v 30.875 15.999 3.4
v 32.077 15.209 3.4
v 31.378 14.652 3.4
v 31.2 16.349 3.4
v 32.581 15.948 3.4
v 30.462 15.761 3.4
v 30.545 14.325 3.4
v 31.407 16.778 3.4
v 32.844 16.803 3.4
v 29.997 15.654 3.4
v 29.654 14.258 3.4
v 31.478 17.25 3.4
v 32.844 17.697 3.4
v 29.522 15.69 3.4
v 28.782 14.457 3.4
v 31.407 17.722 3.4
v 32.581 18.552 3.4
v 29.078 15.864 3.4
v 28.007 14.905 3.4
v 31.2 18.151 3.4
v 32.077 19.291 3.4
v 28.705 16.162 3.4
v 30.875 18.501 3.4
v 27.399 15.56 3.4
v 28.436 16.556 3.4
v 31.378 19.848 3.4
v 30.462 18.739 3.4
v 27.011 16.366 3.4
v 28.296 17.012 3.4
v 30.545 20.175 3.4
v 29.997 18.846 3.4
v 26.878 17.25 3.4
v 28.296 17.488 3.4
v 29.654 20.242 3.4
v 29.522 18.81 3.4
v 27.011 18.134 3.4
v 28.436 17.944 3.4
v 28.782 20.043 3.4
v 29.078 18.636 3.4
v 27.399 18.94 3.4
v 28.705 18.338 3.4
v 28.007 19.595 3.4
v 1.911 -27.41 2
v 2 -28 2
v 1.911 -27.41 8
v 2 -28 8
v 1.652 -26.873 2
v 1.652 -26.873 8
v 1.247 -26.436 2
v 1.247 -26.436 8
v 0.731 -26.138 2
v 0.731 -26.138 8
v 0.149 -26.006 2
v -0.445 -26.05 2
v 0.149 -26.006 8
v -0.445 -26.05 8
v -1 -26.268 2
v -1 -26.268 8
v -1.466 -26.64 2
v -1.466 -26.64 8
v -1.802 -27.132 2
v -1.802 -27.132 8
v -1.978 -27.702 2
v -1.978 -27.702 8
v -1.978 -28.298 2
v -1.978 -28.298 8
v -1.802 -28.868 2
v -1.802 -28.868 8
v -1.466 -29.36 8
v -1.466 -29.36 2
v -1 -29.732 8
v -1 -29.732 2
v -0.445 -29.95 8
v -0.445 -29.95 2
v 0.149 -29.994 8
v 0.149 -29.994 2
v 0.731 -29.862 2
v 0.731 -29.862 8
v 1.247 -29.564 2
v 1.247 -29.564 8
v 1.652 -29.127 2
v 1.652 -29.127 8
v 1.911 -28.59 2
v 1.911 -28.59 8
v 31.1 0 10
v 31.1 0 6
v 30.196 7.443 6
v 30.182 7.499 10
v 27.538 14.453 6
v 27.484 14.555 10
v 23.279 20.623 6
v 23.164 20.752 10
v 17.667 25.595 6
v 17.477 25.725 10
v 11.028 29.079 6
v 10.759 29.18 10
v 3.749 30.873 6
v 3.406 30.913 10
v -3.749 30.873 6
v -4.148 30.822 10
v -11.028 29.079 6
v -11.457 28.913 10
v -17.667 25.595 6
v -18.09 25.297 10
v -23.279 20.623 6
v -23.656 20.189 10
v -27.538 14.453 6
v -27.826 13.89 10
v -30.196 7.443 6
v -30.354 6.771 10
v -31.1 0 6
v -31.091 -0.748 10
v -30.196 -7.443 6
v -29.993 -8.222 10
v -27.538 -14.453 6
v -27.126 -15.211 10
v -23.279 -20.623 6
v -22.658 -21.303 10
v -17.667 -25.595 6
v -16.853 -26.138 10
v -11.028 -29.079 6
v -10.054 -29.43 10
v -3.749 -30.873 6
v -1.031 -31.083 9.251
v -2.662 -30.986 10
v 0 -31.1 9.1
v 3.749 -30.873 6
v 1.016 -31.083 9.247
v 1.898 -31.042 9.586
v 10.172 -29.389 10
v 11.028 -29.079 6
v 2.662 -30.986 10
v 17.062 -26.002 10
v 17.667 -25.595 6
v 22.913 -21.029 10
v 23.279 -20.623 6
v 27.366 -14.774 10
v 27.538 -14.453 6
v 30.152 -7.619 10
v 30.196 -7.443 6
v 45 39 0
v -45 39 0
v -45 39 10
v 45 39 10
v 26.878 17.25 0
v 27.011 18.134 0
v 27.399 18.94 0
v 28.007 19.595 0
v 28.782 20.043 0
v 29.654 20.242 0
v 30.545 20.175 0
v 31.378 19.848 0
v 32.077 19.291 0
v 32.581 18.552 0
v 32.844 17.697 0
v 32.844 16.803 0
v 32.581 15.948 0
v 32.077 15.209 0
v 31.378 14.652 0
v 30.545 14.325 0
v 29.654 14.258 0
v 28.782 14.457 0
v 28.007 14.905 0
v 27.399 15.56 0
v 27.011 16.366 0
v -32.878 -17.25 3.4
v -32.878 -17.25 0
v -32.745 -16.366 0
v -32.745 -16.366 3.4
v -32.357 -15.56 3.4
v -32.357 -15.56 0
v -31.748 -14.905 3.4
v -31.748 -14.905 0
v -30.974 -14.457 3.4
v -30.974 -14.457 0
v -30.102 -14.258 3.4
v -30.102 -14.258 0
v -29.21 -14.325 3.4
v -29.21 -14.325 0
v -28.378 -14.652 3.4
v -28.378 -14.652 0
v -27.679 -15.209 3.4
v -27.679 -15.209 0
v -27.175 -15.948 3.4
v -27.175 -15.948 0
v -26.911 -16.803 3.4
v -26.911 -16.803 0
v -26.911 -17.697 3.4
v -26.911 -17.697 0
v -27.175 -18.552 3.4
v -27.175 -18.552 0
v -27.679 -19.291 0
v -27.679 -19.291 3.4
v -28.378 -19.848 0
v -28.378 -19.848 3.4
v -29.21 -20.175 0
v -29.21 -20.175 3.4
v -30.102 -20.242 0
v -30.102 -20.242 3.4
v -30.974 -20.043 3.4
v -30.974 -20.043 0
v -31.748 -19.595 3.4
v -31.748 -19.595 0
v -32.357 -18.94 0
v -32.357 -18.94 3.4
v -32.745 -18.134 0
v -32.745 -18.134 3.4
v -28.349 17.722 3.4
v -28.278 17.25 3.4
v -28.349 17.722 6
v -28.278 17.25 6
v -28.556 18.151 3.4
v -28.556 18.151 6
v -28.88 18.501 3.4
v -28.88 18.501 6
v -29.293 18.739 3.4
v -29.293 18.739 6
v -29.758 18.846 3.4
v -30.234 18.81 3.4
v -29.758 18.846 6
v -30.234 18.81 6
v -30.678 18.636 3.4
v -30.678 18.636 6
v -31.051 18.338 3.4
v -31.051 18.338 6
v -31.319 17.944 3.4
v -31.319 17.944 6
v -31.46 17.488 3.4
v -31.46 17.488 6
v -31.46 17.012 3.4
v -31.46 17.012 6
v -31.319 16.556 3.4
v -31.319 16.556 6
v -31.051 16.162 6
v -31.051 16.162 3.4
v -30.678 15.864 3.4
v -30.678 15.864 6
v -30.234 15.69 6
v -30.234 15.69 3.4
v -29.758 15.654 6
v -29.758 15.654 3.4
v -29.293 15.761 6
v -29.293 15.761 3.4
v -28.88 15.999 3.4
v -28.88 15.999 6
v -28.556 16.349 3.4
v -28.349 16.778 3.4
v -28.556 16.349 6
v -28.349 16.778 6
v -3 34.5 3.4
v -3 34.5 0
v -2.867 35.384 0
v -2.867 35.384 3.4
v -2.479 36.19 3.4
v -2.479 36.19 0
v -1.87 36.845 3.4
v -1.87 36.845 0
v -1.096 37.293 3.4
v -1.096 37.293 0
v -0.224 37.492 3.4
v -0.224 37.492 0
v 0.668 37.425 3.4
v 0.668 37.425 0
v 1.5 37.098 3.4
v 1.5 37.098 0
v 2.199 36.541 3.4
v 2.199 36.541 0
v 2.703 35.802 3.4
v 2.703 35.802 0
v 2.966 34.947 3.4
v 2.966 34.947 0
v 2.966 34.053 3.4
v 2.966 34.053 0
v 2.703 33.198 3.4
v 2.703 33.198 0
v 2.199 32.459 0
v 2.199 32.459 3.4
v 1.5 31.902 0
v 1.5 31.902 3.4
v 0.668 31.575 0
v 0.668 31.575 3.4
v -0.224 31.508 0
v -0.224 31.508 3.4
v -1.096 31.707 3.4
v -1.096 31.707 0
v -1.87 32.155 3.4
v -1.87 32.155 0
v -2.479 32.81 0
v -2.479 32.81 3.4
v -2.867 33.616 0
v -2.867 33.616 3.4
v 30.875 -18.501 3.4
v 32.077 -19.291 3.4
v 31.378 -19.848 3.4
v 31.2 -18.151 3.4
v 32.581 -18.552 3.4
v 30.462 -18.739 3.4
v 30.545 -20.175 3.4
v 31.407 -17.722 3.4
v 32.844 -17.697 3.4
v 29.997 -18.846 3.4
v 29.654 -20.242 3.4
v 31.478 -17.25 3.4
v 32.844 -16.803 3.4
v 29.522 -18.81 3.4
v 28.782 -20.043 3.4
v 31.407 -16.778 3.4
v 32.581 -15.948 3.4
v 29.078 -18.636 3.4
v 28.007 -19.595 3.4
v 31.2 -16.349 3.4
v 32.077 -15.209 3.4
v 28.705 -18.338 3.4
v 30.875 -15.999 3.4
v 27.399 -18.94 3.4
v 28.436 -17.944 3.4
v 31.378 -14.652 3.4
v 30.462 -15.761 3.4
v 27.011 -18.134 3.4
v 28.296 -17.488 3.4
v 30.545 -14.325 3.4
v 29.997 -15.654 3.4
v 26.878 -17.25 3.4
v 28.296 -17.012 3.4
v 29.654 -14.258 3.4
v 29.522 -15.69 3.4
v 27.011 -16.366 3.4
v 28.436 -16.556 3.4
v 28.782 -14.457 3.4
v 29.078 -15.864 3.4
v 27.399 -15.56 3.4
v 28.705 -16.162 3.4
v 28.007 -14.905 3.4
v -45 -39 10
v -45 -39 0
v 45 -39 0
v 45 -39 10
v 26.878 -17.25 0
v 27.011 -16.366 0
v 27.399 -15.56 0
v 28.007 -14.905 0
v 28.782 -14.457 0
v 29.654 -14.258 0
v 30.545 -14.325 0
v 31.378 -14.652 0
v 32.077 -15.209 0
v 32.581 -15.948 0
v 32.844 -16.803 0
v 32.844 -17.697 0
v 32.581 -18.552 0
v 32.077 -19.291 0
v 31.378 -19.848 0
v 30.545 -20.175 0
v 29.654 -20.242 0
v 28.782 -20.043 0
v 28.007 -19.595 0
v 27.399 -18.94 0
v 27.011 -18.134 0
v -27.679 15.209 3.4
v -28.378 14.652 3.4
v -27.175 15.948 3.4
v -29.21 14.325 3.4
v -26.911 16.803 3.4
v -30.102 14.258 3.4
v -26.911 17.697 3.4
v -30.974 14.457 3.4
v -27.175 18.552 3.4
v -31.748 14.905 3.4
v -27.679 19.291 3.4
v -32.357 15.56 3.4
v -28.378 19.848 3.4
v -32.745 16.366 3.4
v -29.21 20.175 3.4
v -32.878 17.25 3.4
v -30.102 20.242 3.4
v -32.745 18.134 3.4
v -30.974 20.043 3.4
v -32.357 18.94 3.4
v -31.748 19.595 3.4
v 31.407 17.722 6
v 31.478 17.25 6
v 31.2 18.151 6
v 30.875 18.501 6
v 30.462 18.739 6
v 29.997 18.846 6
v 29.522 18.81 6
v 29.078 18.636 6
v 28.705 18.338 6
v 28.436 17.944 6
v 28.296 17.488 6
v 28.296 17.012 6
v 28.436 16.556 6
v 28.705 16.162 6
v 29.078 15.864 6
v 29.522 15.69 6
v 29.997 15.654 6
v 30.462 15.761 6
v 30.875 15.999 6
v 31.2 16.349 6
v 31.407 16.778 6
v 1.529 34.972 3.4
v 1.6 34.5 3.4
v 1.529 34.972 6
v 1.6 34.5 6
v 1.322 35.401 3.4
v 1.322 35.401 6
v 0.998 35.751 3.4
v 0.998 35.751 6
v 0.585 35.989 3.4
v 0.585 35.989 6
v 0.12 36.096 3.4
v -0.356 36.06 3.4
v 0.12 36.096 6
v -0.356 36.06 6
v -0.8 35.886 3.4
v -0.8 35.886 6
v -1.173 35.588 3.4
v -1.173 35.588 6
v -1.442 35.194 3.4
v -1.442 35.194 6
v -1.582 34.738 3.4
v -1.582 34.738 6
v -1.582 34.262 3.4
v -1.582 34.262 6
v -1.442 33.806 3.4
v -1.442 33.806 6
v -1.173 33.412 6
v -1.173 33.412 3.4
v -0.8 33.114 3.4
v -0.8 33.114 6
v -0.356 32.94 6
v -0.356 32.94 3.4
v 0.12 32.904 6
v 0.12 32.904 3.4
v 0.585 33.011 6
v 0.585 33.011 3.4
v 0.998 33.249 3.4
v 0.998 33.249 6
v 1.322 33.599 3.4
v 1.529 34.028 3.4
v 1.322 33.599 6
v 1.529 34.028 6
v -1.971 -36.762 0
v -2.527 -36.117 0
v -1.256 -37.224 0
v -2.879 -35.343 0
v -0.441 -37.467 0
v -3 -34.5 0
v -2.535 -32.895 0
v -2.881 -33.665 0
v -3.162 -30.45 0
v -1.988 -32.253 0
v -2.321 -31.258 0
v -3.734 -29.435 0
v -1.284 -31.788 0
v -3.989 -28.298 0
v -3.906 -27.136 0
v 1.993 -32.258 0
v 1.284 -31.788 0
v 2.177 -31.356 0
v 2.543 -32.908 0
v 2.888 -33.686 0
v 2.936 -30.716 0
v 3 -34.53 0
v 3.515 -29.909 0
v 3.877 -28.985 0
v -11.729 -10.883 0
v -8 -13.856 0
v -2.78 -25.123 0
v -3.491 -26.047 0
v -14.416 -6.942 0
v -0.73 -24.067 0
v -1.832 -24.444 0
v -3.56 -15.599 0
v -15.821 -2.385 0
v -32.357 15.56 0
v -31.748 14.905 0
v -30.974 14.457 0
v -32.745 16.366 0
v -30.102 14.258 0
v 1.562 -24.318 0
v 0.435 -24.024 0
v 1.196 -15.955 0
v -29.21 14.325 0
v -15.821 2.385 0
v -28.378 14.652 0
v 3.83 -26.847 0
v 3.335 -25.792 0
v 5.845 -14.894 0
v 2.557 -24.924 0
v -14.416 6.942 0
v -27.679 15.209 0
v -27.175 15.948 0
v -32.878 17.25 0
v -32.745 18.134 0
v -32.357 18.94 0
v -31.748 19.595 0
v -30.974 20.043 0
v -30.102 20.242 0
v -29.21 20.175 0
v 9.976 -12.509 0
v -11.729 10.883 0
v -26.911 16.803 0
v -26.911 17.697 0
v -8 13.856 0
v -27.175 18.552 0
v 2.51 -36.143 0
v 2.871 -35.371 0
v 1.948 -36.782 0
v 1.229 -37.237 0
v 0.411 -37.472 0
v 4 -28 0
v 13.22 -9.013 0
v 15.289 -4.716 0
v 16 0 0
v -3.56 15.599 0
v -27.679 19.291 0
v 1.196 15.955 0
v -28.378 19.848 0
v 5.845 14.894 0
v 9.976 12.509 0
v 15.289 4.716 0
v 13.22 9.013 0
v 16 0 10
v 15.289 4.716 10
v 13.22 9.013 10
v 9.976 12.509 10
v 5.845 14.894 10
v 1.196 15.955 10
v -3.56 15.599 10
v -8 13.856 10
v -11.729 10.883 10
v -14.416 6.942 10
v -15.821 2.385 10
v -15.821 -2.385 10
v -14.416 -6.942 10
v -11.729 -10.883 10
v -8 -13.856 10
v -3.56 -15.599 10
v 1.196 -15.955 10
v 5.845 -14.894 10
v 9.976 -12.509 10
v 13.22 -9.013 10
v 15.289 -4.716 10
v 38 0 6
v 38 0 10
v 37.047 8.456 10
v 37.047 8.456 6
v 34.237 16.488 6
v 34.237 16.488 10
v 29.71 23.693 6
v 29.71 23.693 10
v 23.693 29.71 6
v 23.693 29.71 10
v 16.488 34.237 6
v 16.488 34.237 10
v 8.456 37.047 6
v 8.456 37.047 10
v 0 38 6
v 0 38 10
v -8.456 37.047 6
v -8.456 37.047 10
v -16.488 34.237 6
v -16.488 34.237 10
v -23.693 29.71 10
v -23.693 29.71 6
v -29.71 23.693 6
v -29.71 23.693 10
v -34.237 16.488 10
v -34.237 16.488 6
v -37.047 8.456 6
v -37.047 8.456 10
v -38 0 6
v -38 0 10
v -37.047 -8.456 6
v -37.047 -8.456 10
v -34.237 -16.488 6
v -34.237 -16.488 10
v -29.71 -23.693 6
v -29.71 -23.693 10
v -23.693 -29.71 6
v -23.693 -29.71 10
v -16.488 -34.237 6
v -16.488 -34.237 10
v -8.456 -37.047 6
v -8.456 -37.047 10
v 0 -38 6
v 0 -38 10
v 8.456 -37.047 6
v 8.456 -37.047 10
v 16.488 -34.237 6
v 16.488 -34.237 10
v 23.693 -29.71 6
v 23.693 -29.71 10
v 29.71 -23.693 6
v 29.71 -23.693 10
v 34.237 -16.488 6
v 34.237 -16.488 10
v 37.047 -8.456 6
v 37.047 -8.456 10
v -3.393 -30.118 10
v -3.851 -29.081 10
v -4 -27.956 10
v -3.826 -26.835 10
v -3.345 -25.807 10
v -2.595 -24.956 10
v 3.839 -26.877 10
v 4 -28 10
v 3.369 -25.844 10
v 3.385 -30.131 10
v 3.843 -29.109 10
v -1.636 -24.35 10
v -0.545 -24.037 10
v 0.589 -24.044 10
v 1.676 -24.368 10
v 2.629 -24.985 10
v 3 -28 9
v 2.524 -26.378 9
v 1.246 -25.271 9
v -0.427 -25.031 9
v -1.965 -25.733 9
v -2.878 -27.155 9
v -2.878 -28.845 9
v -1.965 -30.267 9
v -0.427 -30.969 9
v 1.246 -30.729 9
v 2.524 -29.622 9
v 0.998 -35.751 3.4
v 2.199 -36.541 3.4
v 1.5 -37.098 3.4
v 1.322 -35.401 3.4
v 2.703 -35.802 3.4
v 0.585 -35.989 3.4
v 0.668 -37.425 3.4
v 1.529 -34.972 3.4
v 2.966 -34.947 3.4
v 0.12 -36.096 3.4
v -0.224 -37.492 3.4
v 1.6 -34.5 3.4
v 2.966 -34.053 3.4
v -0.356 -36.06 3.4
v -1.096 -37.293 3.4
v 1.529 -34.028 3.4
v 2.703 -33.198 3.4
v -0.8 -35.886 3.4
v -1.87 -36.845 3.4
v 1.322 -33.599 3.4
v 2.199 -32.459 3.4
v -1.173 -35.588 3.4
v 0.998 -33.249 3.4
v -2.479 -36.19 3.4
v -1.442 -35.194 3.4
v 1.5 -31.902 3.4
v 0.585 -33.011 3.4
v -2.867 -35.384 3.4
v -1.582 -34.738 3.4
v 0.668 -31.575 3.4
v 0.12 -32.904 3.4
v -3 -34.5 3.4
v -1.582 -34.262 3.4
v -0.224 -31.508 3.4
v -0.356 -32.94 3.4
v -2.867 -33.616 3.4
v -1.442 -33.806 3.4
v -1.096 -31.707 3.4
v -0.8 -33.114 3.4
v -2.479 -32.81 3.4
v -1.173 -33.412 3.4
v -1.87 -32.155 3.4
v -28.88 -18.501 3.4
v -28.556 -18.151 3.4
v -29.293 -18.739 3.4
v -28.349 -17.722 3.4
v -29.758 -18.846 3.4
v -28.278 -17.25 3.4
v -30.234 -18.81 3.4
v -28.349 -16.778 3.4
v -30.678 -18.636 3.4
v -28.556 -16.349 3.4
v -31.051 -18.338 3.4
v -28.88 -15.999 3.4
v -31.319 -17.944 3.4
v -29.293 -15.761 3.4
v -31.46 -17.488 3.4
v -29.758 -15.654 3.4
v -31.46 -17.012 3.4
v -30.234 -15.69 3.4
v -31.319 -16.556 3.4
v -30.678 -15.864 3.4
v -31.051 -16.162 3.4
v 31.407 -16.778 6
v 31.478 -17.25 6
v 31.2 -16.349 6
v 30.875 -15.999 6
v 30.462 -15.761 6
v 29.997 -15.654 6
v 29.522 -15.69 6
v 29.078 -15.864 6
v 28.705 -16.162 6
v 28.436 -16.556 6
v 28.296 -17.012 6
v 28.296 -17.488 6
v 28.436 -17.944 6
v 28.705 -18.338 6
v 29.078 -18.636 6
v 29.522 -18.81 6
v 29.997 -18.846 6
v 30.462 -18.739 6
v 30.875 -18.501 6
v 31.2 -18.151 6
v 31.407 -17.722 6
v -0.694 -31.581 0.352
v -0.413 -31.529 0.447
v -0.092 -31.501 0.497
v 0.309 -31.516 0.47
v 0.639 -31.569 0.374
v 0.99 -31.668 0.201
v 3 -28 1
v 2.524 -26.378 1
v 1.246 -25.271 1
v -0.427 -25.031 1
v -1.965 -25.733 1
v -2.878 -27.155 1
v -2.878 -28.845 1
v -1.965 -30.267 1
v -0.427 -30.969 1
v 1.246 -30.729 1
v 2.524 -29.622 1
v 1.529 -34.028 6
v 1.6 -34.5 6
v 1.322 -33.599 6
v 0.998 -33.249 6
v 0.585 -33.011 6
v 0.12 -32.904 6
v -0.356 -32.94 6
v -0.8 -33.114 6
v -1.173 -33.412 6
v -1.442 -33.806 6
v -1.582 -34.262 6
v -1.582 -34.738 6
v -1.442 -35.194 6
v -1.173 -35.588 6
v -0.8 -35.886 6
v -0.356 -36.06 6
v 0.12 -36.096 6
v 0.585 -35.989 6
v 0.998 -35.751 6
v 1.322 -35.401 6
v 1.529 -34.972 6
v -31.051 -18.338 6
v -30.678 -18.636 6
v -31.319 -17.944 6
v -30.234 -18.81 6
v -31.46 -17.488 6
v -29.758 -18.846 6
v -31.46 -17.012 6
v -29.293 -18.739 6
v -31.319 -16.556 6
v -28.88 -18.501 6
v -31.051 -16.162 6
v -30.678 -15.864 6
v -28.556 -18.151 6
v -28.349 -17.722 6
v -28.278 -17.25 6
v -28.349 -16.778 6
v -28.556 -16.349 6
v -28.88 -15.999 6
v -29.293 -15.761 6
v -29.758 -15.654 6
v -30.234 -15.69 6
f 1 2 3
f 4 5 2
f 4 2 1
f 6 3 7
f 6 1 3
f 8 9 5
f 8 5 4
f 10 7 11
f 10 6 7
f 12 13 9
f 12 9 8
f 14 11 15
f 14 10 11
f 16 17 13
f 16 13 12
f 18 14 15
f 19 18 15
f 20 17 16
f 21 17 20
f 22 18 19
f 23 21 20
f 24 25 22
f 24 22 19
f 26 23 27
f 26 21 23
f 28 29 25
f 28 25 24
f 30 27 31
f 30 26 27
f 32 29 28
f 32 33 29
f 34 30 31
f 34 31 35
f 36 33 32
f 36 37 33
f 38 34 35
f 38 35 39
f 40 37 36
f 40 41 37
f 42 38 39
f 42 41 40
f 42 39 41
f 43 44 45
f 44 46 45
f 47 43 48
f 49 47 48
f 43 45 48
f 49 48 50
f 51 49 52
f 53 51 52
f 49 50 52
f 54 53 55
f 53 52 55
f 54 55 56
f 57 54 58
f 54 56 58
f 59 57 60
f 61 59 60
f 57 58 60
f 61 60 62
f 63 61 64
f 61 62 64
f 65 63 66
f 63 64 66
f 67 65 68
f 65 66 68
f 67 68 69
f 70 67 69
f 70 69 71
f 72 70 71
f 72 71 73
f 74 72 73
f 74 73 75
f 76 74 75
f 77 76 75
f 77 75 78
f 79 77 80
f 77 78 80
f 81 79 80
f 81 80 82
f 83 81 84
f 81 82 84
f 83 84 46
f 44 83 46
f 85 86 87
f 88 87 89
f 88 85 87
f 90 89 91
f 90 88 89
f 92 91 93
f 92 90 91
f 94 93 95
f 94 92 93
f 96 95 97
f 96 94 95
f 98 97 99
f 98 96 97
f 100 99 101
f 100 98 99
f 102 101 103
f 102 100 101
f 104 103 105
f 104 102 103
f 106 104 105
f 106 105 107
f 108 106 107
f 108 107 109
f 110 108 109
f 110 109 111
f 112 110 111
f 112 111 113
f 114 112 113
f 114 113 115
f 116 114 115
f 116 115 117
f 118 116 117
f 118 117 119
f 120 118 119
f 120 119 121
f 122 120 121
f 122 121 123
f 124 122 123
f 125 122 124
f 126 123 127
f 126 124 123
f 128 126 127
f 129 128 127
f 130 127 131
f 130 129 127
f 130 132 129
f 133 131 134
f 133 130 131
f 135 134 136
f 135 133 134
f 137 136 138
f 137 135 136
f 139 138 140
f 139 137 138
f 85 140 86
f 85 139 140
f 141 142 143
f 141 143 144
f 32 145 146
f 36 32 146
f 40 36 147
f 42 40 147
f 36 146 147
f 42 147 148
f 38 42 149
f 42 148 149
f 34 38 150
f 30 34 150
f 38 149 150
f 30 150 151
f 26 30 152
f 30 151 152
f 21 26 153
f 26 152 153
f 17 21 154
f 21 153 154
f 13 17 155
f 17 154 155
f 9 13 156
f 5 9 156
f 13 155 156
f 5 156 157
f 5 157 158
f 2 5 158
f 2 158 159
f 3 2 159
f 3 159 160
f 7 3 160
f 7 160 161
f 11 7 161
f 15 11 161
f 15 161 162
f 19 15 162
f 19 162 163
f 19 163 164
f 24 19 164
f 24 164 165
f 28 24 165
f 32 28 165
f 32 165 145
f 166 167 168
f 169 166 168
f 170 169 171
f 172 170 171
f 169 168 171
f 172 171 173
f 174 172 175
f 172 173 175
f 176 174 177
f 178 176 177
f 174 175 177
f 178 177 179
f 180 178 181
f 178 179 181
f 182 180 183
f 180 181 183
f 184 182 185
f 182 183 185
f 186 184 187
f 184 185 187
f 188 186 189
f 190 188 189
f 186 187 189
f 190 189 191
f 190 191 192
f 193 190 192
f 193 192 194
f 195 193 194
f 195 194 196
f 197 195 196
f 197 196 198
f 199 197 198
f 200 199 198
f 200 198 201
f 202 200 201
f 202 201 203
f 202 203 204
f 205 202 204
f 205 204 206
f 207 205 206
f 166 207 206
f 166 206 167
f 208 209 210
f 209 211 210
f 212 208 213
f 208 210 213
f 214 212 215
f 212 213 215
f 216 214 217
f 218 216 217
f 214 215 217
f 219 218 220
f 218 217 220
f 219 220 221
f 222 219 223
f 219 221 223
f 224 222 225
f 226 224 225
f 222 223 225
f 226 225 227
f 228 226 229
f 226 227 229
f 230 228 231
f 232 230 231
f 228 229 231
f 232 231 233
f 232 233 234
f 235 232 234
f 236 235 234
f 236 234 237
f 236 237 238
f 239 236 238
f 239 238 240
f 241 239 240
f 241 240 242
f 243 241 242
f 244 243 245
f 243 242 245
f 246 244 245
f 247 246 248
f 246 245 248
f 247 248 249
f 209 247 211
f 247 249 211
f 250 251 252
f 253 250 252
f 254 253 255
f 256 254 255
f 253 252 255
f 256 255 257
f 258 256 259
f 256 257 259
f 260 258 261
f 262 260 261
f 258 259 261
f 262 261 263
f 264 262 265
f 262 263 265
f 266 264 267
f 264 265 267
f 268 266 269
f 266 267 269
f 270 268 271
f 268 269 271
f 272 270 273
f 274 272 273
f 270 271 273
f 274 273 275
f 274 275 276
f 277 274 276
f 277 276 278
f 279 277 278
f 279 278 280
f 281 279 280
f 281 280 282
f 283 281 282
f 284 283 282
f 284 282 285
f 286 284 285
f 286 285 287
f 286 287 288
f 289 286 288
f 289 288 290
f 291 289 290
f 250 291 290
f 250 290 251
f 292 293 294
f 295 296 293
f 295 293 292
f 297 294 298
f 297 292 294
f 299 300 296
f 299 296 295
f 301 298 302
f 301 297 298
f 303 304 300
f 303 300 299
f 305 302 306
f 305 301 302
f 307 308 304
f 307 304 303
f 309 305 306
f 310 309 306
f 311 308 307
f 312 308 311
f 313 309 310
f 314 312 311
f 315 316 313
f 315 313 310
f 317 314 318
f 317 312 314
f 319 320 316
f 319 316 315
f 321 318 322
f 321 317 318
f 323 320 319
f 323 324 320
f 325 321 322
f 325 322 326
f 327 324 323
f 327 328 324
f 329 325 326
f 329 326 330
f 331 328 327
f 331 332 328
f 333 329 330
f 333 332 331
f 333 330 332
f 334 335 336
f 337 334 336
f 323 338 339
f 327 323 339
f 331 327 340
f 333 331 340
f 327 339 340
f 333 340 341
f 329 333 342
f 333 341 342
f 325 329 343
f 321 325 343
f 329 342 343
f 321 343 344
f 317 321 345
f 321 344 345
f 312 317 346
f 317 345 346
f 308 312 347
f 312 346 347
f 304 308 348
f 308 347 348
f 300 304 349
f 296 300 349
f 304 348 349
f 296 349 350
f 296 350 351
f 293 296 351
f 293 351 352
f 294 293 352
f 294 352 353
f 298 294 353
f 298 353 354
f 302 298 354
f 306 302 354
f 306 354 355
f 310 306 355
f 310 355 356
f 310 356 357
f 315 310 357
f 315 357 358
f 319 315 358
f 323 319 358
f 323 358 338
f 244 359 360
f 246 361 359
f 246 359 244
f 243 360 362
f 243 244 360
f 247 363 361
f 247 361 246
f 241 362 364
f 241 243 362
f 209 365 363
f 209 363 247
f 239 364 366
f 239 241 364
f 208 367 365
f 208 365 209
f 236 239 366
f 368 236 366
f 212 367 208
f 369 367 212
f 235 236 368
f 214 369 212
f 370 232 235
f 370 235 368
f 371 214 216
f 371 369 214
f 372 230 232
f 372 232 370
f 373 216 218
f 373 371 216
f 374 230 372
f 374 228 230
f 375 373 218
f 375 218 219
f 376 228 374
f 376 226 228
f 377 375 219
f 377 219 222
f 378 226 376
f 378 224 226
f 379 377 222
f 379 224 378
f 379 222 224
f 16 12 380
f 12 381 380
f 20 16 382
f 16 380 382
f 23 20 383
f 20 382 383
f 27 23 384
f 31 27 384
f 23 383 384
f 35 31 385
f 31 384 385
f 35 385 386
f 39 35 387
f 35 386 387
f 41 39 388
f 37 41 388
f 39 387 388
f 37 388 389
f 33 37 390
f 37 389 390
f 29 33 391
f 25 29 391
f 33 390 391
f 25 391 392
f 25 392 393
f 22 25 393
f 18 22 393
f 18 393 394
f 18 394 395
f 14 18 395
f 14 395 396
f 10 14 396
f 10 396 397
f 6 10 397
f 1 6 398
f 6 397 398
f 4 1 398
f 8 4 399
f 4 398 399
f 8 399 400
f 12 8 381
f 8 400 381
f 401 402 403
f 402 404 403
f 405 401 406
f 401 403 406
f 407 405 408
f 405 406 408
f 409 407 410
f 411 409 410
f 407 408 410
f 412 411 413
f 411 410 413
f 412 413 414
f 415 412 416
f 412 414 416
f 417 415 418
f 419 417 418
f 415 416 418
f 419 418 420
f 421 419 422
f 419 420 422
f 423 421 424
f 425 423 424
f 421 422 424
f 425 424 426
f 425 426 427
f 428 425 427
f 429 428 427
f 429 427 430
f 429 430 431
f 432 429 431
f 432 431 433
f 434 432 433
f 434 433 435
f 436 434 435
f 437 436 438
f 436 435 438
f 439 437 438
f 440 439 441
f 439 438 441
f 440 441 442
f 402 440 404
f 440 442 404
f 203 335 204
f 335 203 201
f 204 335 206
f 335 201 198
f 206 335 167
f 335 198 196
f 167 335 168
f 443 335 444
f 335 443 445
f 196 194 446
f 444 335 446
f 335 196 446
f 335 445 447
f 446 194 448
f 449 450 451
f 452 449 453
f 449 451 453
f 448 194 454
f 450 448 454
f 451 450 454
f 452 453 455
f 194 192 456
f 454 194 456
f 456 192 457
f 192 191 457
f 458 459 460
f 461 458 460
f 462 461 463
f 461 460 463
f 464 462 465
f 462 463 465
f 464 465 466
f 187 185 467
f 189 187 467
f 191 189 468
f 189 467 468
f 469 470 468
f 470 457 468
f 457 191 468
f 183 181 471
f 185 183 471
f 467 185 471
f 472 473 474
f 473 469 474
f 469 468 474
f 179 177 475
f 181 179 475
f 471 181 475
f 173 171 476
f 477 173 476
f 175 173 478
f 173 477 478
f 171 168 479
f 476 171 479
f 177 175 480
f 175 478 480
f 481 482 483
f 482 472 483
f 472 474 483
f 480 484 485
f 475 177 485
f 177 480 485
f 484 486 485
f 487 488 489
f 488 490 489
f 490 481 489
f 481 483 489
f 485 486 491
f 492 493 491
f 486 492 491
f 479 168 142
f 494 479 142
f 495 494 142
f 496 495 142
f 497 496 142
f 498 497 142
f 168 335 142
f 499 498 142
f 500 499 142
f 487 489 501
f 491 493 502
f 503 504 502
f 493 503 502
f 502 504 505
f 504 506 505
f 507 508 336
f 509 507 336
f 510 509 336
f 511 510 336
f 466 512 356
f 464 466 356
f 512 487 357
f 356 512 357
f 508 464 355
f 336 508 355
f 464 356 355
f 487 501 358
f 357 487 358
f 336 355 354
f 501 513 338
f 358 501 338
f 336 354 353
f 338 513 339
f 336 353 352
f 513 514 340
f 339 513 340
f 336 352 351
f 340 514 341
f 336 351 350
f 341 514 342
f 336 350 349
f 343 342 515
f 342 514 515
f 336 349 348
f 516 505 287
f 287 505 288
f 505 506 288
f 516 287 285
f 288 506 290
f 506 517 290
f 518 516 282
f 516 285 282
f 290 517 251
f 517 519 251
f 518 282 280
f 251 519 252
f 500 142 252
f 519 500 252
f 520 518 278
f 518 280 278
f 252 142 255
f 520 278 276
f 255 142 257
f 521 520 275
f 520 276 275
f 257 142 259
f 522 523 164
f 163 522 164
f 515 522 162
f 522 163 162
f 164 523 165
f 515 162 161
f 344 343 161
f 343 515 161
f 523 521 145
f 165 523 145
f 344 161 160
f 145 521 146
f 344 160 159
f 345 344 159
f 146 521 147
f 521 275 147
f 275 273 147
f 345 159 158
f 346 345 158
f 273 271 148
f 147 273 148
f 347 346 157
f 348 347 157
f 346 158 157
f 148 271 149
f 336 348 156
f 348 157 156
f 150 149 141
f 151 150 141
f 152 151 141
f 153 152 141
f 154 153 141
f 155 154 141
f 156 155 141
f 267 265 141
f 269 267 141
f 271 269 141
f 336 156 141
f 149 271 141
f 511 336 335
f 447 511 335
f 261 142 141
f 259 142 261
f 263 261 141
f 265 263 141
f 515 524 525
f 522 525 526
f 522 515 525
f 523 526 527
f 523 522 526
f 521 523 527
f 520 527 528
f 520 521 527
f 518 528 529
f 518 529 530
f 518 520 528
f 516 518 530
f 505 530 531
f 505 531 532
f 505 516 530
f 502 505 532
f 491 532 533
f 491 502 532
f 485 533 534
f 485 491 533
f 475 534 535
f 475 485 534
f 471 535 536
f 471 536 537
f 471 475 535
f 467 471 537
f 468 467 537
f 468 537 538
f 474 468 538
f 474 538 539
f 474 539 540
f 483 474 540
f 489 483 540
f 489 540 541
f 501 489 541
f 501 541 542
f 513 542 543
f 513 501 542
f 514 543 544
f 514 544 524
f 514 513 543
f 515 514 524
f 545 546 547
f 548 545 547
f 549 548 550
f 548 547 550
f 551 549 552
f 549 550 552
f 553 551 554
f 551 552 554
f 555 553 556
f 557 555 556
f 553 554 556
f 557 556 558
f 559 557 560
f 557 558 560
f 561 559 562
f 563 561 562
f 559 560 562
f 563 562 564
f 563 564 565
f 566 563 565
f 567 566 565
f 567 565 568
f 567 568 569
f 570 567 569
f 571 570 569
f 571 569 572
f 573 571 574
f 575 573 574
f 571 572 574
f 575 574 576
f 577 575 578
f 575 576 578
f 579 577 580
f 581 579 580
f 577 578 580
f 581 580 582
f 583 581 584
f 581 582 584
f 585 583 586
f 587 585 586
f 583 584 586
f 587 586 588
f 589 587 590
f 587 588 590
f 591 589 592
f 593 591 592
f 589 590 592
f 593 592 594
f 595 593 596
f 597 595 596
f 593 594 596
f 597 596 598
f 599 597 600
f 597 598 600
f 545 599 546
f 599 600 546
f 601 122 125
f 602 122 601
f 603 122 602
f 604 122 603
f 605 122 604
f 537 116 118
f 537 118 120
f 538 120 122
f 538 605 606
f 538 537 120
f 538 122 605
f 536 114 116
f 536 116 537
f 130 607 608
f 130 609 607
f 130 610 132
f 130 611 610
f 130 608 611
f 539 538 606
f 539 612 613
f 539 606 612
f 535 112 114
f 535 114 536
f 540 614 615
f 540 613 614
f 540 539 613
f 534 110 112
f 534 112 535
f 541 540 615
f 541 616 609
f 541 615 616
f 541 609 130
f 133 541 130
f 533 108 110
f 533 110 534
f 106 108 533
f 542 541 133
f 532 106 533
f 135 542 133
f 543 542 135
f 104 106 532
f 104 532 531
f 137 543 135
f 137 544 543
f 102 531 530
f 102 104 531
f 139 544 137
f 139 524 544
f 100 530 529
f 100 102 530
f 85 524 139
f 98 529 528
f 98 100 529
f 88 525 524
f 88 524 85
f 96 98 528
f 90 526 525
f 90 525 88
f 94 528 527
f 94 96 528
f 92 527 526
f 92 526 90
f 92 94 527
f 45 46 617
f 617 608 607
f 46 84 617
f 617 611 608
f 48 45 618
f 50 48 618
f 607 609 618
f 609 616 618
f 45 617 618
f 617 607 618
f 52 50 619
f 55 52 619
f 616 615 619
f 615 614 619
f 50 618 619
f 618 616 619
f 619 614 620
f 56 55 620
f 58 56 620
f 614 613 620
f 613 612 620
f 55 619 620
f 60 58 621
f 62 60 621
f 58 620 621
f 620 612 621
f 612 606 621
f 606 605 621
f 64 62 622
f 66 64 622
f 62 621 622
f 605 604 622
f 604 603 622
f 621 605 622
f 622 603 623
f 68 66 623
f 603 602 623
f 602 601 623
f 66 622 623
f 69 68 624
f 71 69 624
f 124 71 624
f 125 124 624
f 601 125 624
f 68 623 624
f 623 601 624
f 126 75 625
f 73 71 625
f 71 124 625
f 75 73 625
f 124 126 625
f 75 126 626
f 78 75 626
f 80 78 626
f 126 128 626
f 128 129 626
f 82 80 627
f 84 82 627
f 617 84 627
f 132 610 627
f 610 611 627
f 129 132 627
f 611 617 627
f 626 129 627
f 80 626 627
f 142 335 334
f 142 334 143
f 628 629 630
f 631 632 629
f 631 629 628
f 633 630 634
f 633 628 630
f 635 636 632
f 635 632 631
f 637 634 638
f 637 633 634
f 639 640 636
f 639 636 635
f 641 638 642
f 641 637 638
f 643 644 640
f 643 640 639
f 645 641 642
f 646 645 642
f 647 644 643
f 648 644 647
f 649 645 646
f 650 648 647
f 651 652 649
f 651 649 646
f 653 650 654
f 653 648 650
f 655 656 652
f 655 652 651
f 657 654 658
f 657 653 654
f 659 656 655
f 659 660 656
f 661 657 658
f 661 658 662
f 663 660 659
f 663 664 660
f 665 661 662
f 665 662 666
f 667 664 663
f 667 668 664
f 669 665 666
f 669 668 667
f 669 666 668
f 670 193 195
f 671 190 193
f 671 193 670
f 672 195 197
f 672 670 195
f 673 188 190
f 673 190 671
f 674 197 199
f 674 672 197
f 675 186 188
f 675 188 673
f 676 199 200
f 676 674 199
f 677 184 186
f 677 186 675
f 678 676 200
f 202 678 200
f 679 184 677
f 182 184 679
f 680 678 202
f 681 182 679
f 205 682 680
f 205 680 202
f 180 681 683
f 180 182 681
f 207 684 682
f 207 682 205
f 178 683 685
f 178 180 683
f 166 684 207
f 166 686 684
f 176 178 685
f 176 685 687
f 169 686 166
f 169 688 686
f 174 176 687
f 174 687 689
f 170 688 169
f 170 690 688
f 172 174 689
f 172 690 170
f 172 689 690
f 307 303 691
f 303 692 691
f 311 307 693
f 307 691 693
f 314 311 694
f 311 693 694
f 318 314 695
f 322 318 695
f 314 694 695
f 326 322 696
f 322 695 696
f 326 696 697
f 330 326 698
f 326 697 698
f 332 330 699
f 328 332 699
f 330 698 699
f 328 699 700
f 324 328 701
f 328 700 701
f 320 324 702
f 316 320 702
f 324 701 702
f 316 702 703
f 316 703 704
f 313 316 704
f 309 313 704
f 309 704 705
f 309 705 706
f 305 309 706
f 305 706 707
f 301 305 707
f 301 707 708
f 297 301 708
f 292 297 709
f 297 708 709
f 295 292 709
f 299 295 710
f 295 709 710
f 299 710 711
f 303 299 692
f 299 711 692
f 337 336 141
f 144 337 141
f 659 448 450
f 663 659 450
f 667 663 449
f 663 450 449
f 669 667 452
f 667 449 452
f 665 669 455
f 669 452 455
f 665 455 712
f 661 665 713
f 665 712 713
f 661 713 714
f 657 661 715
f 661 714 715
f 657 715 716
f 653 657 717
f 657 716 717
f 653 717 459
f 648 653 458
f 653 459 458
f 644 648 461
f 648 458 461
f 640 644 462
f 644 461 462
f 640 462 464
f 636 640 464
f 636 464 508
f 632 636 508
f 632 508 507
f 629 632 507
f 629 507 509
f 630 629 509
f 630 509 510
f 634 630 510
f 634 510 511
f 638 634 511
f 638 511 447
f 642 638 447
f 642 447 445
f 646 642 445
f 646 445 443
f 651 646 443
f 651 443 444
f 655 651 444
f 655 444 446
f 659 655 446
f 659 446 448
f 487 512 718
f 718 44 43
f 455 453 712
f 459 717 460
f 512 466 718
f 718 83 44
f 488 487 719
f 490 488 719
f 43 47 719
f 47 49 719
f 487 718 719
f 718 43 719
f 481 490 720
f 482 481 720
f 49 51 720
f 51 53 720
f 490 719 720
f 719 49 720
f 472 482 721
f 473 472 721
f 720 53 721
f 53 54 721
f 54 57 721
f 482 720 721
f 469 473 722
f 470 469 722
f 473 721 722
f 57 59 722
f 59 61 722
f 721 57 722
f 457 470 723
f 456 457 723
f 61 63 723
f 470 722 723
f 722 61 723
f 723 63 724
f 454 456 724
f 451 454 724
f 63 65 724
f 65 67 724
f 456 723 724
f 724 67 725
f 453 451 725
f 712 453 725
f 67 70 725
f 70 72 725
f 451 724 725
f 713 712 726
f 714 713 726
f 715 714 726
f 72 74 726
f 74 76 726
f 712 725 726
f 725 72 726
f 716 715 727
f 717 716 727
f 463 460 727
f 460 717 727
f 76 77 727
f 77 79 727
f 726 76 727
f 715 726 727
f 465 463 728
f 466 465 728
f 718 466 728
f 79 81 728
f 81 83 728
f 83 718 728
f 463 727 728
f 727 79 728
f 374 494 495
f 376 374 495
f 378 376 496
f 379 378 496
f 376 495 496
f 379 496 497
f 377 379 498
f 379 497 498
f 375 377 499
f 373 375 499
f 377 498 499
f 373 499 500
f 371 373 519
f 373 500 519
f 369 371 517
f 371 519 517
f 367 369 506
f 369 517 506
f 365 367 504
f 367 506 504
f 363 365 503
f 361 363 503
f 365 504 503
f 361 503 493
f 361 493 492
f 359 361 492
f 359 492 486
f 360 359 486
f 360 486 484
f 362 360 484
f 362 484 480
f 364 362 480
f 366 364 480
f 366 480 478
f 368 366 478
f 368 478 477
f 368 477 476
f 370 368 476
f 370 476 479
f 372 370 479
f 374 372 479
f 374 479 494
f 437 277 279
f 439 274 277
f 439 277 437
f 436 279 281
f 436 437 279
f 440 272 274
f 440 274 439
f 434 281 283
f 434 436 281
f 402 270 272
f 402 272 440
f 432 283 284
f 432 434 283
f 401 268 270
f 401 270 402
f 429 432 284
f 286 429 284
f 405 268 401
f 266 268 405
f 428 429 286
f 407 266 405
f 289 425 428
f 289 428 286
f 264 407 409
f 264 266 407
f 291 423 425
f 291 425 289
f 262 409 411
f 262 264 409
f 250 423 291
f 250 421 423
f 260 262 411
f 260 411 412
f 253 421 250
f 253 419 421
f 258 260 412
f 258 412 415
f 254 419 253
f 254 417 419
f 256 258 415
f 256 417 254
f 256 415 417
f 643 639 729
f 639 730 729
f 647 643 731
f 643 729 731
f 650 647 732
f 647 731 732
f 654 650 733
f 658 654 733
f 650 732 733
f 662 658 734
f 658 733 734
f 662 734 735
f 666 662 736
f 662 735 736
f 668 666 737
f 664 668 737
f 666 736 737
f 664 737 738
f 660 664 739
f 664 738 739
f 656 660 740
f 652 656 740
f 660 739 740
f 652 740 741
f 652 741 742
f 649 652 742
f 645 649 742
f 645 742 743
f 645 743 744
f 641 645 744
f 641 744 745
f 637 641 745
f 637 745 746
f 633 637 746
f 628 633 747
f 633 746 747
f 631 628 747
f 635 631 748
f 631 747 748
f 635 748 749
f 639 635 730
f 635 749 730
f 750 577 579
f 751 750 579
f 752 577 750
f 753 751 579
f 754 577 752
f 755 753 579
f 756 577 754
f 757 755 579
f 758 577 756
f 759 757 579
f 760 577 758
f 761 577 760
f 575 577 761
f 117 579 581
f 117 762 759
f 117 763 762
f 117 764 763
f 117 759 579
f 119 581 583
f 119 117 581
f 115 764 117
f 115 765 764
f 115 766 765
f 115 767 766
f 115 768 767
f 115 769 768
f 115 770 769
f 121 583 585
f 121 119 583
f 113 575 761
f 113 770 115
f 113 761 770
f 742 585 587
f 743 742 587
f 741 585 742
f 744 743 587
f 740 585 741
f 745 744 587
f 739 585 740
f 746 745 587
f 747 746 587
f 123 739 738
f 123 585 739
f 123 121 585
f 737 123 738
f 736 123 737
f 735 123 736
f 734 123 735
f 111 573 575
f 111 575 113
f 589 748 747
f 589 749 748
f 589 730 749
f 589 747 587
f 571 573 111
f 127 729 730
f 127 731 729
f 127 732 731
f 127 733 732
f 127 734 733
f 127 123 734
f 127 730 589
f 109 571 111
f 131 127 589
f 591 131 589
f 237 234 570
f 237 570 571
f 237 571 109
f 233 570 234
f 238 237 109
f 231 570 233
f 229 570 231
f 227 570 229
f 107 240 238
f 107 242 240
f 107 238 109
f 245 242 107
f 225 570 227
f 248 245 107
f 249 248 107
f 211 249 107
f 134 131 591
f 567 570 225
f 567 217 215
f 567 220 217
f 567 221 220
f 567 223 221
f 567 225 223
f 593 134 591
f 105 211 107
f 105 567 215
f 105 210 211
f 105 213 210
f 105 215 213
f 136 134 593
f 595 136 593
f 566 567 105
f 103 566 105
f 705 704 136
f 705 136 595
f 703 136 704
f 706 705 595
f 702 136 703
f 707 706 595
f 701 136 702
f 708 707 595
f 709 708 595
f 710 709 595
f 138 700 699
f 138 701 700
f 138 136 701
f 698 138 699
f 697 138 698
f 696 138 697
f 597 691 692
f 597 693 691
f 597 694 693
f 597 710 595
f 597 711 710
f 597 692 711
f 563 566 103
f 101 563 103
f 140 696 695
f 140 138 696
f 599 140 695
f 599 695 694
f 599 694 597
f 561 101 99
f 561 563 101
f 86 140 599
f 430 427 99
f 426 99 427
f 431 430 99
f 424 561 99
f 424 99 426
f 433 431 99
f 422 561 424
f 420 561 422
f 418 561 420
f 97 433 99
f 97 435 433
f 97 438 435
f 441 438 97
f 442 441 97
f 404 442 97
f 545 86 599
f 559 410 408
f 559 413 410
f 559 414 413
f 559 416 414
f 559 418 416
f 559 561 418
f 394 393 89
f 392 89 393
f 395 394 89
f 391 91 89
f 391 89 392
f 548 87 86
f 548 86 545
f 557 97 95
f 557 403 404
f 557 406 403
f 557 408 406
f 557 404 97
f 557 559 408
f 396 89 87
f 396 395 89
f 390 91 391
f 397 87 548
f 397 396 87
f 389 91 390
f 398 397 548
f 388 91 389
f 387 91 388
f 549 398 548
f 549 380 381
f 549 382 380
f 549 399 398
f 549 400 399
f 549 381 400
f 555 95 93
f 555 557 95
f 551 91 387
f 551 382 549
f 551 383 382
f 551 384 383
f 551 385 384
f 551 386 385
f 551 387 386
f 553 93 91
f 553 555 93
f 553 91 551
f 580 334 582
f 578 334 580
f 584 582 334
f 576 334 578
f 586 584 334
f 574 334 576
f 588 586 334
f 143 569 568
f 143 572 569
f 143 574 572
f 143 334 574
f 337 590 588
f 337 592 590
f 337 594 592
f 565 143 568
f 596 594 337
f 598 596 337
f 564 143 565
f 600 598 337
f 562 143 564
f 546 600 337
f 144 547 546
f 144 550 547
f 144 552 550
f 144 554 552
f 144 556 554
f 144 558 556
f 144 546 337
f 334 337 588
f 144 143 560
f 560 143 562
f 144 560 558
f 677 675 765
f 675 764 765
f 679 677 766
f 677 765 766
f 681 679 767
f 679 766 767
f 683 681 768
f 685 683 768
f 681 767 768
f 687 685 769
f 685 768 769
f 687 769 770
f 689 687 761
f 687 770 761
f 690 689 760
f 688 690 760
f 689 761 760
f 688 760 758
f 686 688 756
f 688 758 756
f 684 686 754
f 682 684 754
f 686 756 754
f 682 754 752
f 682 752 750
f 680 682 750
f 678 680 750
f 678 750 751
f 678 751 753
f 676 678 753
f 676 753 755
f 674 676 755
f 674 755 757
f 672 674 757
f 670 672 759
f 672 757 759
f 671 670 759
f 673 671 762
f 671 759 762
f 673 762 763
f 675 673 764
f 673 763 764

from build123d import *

# Parameters (mm, degrees)
SKETCH_1_W                = 90
SKETCH_1_H                = 78
SKETCH_1_R                = 16
EXTRUDE_1_DEPTH           = 10
SKETCH_2_R                = 38
SKETCH_2_R_2              = 31.1
CUT_EXTRUDE_1_DEPTH       = 4
HOLE_WIZARD_1_D           = 3.2
HOLE_WIZARD_1_DEPTH       = 8.5
HOLE_WIZARD_1_CBORE_D     = 6
HOLE_WIZARD_1_CBORE_DEPTH = 3.4
HOLE_WIZARD_1_TIP         = 0.96137699
HOLE_WIZARD_4_0_4_1_D     = 4
CHAMFER_1_SIZE            = 2


with BuildPart() as part:
    # 草图1 → 凸台-拉伸1 (new body)
    with BuildSketch(Plane.XY):
        Rectangle(SKETCH_1_W, SKETCH_1_H)
        Circle(SKETCH_1_R, mode=Mode.SUBTRACT)
    extrude(amount=EXTRUDE_1_DEPTH)

    # 草图2 → 切除-拉伸1 (cut)
    with BuildSketch(Plane.XY.offset(10)):
        Circle(SKETCH_2_R)
        Circle(SKETCH_2_R_2, mode=Mode.SUBTRACT)
    extrude(amount=-CUT_EXTRUDE_1_DEPTH, mode=Mode.SUBTRACT)

    # 打孔尺寸(%根据)内六角圆柱头螺钉的类型1
    with Locations(Plane(origin=(0, 0, 0), x_dir=(-1, 0, 0), z_dir=(0, 0, -1))):
        with Locations((0, 34.5), (29.877876431, 17.25), (29.877876431, -17.25), (0, -34.5), (-29.877876431, -17.25), (-29.877876431, 17.25)):
            CounterBoreHole(HOLE_WIZARD_1_D / 2, HOLE_WIZARD_1_CBORE_D / 2, HOLE_WIZARD_1_CBORE_DEPTH, depth=HOLE_WIZARD_1_DEPTH)
            with Locations((0, 0, -(HOLE_WIZARD_1_DEPTH + HOLE_WIZARD_1_TIP / 2))):  # 118° drill point
                Cone(0, HOLE_WIZARD_1_D / 2, HOLE_WIZARD_1_TIP, mode=Mode.SUBTRACT)

    # Ø4.0 (4) 直径孔1 (through all)
    with Locations(Plane(origin=(0, 0, 0), x_dir=(-1, 0, 0), z_dir=(0, 0, -1))):
        with Locations((0, -28)):
            Hole(HOLE_WIZARD_4_0_4_1_D / 2)

    # 倒角1
    # the kernel refuses this chamfer: 2 mm, written as the material it takes off along each edge
    with BuildSketch(Plane(origin=(0, -28, 0), x_dir=(1, 0, 0), z_dir=(0, -1, 0))) as chamfer_1_piece_1:
        Polygon((2 + CHAMFER_1_SIZE, 0), (2, CHAMFER_1_SIZE), (2, 0), align=None)
    revolve(axis=Axis((0, -28, 0), (0, 0, 1)), mode=Mode.SUBTRACT)
    with BuildSketch(Plane(origin=(0, -28, 10), x_dir=(1, 0, 0), z_dir=(0, -1, 0))) as chamfer_1_piece_2:
        Polygon((2, -CHAMFER_1_SIZE), (2 + CHAMFER_1_SIZE, 0), (2, 0), align=None)
    revolve(axis=Axis((0, -28, 10), (0, 0, 1)), mode=Mode.SUBTRACT)


solid = part.part
